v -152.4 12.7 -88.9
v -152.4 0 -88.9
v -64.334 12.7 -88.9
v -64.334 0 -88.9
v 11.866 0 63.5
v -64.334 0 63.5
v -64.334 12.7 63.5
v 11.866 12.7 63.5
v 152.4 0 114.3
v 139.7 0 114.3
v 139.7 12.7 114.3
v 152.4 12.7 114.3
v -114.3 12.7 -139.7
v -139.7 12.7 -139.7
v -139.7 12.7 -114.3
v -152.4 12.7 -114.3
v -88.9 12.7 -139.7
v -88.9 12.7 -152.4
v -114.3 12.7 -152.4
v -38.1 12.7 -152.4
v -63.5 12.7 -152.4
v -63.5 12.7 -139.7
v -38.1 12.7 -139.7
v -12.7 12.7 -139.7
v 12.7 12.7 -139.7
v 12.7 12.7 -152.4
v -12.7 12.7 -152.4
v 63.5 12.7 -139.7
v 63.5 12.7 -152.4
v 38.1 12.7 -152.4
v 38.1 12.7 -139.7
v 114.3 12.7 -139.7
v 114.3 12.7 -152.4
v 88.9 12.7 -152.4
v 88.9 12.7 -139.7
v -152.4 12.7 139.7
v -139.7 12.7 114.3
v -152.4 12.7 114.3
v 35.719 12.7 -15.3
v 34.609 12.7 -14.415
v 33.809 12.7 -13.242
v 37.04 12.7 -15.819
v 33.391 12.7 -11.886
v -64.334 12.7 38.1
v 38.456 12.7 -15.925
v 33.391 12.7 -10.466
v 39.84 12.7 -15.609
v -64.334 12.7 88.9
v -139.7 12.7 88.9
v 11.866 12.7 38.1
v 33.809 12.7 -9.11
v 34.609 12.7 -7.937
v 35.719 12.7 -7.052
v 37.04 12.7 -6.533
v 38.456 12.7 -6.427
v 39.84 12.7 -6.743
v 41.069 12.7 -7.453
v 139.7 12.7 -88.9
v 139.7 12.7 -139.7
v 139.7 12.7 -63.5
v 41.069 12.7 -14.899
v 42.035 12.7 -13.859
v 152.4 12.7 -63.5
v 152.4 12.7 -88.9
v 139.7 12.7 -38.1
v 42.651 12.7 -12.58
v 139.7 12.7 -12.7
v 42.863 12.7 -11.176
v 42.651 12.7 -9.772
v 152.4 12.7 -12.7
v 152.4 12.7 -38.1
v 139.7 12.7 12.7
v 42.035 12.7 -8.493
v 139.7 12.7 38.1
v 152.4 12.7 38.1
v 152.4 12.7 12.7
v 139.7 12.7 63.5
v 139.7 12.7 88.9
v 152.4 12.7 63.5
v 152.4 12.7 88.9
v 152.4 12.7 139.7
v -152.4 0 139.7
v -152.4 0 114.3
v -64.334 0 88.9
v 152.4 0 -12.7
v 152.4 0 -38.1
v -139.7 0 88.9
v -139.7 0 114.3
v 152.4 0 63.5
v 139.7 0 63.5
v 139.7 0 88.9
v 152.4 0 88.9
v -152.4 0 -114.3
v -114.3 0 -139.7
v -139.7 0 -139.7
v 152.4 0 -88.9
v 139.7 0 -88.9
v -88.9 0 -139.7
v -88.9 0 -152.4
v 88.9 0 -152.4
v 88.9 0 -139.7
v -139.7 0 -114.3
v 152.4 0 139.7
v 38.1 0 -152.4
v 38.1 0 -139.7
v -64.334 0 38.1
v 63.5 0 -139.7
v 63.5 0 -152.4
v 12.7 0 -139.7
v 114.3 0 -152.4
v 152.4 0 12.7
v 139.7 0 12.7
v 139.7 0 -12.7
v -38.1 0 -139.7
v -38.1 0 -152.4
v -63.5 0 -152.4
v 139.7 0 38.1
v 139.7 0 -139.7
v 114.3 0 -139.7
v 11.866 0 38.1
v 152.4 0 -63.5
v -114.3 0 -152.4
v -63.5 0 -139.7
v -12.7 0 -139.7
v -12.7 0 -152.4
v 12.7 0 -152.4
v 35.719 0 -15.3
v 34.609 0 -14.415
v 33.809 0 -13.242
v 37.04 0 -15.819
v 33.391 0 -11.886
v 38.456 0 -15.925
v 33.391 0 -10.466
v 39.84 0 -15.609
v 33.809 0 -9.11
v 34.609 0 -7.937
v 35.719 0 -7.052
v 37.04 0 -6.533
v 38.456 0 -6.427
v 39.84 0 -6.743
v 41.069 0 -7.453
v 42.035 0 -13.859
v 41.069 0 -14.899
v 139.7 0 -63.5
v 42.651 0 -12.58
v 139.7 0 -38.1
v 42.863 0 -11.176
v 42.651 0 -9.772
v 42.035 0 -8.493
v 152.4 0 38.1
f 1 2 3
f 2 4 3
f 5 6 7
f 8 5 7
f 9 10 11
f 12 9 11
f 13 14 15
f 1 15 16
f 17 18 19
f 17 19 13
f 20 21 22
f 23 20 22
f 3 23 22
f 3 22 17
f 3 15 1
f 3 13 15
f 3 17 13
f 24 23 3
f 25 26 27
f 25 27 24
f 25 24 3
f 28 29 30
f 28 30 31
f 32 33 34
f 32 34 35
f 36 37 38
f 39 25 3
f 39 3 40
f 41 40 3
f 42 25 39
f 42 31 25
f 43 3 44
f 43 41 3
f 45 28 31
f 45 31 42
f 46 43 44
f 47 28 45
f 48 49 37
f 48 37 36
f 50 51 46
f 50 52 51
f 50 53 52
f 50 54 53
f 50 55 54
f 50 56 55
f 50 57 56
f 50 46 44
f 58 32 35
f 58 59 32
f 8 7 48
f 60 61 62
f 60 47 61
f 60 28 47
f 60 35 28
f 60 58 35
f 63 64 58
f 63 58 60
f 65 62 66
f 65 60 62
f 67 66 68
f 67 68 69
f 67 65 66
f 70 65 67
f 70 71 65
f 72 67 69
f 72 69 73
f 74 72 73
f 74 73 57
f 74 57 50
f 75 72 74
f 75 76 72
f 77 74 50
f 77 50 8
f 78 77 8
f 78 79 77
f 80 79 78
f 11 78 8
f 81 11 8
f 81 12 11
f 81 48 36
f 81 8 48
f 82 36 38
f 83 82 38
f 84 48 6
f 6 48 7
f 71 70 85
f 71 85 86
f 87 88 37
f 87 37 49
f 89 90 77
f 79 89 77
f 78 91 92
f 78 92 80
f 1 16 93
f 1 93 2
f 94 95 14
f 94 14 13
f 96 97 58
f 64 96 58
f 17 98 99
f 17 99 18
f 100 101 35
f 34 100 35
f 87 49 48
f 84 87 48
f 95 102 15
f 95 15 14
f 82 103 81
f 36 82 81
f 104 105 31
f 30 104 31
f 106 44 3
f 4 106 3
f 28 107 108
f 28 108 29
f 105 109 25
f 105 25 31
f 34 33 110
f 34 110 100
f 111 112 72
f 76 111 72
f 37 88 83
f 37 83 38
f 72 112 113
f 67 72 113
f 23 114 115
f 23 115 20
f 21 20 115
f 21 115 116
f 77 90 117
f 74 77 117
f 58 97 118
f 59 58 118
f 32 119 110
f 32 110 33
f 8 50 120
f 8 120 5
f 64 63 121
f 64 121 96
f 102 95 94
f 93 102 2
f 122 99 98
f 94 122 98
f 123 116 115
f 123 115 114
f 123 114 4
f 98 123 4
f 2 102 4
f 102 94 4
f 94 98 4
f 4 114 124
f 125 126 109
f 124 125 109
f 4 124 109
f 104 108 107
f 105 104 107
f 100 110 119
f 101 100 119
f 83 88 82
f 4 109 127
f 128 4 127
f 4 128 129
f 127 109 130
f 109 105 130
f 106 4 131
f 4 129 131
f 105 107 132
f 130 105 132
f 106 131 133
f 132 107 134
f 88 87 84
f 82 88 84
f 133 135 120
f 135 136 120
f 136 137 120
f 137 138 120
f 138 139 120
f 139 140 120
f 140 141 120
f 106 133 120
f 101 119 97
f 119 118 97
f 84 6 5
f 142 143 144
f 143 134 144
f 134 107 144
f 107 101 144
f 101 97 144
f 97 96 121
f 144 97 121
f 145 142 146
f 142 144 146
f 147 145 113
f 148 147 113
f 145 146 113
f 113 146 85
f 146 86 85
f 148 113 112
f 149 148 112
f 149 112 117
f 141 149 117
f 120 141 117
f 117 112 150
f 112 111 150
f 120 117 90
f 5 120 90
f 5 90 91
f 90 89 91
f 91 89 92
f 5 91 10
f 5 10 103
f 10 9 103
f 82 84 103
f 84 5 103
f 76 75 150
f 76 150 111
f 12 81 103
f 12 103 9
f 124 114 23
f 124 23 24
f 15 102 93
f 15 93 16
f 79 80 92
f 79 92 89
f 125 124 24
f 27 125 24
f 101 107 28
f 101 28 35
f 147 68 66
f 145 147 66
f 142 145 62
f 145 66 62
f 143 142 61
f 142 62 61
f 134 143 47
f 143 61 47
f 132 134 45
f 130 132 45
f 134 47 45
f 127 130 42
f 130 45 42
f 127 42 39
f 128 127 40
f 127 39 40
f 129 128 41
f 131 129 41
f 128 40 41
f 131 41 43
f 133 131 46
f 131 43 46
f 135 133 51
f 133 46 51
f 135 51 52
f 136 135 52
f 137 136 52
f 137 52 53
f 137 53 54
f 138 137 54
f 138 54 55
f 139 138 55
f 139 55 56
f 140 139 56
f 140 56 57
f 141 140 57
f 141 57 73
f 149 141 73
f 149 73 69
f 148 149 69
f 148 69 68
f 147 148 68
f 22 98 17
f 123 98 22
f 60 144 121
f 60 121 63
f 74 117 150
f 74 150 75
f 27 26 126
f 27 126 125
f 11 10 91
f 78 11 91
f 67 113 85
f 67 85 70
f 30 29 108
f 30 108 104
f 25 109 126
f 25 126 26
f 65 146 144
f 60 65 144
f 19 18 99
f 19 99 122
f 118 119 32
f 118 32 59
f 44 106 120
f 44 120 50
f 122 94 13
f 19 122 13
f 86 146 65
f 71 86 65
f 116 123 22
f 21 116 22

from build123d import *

# Parameters (mm, degrees)
SKETCH1_W               = 279.4
SKETCH1_H               = 279.4
BOSS_EXTRUDE1_DEPTH     = 12.7
SKETCH2_W               = 25.4
SKETCH2_H               = 12.7
BOSS_EXTRUDE2_DEPTH     = 12.7
LPATTERN1_COUNT         = 5
LPATTERN1_PITCH         = 50.8
MIRROR1_COPY_1_SKETCH_W = 25.4
MIRROR1_COPY_1_SKETCH_H = 12.7
MIRROR1_COPY_1_DEPTH    = 12.7
MIRROR1_COPY_2_SKETCH_W = 25.4
MIRROR1_COPY_2_SKETCH_H = 12.7
MIRROR1_COPY_2_DEPTH    = 12.7
MIRROR1_COPY_3_SKETCH_W = 25.4
MIRROR1_COPY_3_SKETCH_H = 12.7
MIRROR1_COPY_3_DEPTH    = 12.7
MIRROR1_COPY_4_SKETCH_W = 25.4
MIRROR1_COPY_4_SKETCH_H = 12.7
MIRROR1_COPY_4_DEPTH    = 12.7
SKETCH3_W               = 25.4
SKETCH3_H               = 12.7
BOSS_EXTRUDE3_DEPTH     = 12.7
LPATTERN2_COUNT         = 5
LPATTERN2_PITCH         = 50.8
SKETCH6_R               = 4.7625
CUT_EXTRUDE1_DEPTH      = 13.7
SKETCH8_W               = 88.066093183
SKETCH8_H               = 177.8
CUT_EXTRUDE3_DEPTH      = 13.7
SKETCH9_W               = 25.4
SKETCH9_H               = 12.7
BOSS_EXTRUDE4_DEPTH     = 12.7
SKETCH11_W              = 25.4
SKETCH11_H              = 12.7
CUT_EXTRUDE4_DEPTH      = 76.2


with BuildPart() as part:
    # Sketch1 → Boss-Extrude1 (new body)
    with BuildSketch(Plane(origin=(0, 0, 0), x_dir=(1, 0, 0), z_dir=(0, 1, 0))):
        Rectangle(SKETCH1_W, SKETCH1_H)
    extrude(amount=BOSS_EXTRUDE1_DEPTH)

    # Sketch2 → Boss-Extrude2 (add)
    with BuildSketch(Plane(origin=(139.7, 0, 0), x_dir=(0, 0, -1), z_dir=(1, 0, 0))):
        with Locations((-127, 6.35)):
            Rectangle(SKETCH2_W, SKETCH2_H)
    boss_extrude2 = extrude(amount=BOSS_EXTRUDE2_DEPTH)

    # LPattern1: Boss-Extrude2 ×5
    with Locations(*[(0, 0, -i * LPATTERN1_PITCH) for i in range(1, LPATTERN1_COUNT)]):
        add(boss_extrude2)

    # Mirror1: Boss-Extrude2 across plane
    add(boss_extrude2.mirror(Plane(origin=(0, 0, 0), x_dir=(0, 0, 1), z_dir=(1, 0, 0))))

    # Mirror1 copy 1 sketch → Mirror1 copy 1 (add)
    with BuildSketch(Plane(origin=(-139.7, 0, -50.8), x_dir=(0, 0, -1), z_dir=(-1, 0, 0))):
        with Locations((-127, -6.35)):
            Rectangle(MIRROR1_COPY_1_SKETCH_W, MIRROR1_COPY_1_SKETCH_H)
    extrude(amount=MIRROR1_COPY_1_DEPTH)

    # Mirror1 copy 2 sketch → Mirror1 copy 2 (add)
    with BuildSketch(Plane(origin=(-139.7, 0, -101.6), x_dir=(0, 0, -1), z_dir=(-1, 0, 0))):
        with Locations((-127, -6.35)):
            Rectangle(MIRROR1_COPY_2_SKETCH_W, MIRROR1_COPY_2_SKETCH_H)
    extrude(amount=MIRROR1_COPY_2_DEPTH)

    # Mirror1 copy 3 sketch → Mirror1 copy 3 (add)
    with BuildSketch(Plane(origin=(-139.7, 0, -152.4), x_dir=(0, 0, -1), z_dir=(-1, 0, 0))):
        with Locations((-127, -6.35)):
            Rectangle(MIRROR1_COPY_3_SKETCH_W, MIRROR1_COPY_3_SKETCH_H)
    extrude(amount=MIRROR1_COPY_3_DEPTH)

    # Mirror1 copy 4 sketch → Mirror1 copy 4 (add)
    with BuildSketch(Plane(origin=(-139.7, 0, -203.2), x_dir=(0, 0, -1), z_dir=(-1, 0, 0))):
        with Locations((-127, -6.35)):
            Rectangle(MIRROR1_COPY_4_SKETCH_W, MIRROR1_COPY_4_SKETCH_H)
    extrude(amount=MIRROR1_COPY_4_DEPTH)

    # Sketch3 → Boss-Extrude3 (add)
    with BuildSketch(Plane(origin=(0, 0, -139.7), x_dir=(-1, 0, 0), z_dir=(0, 0, -1))):
        with Locations((-101.6, 6.35)):
            Rectangle(SKETCH3_W, SKETCH3_H)
    boss_extrude3 = extrude(amount=BOSS_EXTRUDE3_DEPTH)

    # LPattern2: Boss-Extrude3 ×5
    with Locations(*[(-i * LPATTERN2_PITCH, 0, 0) for i in range(1, LPATTERN2_COUNT)]):
        add(boss_extrude3)

    # Sketch6 → Cut-Extrude1 (cut, through all)
    with BuildSketch(Plane(origin=(0, 12.7, 0), x_dir=(1, 0, 0), z_dir=(0, 1, 0))):
        with Locations((38.1, 11.176)):
            Circle(SKETCH6_R)
    extrude(amount=-CUT_EXTRUDE1_DEPTH, mode=Mode.SUBTRACT)

    # Sketch8 → Cut-Extrude3 (cut, through all)
    with BuildSketch(Plane(origin=(0, 12.7, 0), x_dir=(1, 0, 0), z_dir=(0, 1, 0))):
        with Locations((-108.366953408, 0)):
            Rectangle(SKETCH8_W, SKETCH8_H)
    extrude(amount=-CUT_EXTRUDE3_DEPTH, mode=Mode.SUBTRACT)

    # Sketch9 → Boss-Extrude4 (add)
    with BuildSketch(Plane.ZY.offset(139.7)):
        with Locations((-101.6, 6.35)):
            Rectangle(SKETCH9_W, SKETCH9_H)
    extrude(amount=BOSS_EXTRUDE4_DEPTH)

    # Sketch11 → Cut-Extrude4 (cut)
    with BuildSketch(Plane.ZY.offset(64.333906817)):
        with Locations((50.8, 6.35)):
            Rectangle(SKETCH11_W, SKETCH11_H)
    extrude(amount=-CUT_EXTRUDE4_DEPTH, mode=Mode.SUBTRACT)


solid = part.part
